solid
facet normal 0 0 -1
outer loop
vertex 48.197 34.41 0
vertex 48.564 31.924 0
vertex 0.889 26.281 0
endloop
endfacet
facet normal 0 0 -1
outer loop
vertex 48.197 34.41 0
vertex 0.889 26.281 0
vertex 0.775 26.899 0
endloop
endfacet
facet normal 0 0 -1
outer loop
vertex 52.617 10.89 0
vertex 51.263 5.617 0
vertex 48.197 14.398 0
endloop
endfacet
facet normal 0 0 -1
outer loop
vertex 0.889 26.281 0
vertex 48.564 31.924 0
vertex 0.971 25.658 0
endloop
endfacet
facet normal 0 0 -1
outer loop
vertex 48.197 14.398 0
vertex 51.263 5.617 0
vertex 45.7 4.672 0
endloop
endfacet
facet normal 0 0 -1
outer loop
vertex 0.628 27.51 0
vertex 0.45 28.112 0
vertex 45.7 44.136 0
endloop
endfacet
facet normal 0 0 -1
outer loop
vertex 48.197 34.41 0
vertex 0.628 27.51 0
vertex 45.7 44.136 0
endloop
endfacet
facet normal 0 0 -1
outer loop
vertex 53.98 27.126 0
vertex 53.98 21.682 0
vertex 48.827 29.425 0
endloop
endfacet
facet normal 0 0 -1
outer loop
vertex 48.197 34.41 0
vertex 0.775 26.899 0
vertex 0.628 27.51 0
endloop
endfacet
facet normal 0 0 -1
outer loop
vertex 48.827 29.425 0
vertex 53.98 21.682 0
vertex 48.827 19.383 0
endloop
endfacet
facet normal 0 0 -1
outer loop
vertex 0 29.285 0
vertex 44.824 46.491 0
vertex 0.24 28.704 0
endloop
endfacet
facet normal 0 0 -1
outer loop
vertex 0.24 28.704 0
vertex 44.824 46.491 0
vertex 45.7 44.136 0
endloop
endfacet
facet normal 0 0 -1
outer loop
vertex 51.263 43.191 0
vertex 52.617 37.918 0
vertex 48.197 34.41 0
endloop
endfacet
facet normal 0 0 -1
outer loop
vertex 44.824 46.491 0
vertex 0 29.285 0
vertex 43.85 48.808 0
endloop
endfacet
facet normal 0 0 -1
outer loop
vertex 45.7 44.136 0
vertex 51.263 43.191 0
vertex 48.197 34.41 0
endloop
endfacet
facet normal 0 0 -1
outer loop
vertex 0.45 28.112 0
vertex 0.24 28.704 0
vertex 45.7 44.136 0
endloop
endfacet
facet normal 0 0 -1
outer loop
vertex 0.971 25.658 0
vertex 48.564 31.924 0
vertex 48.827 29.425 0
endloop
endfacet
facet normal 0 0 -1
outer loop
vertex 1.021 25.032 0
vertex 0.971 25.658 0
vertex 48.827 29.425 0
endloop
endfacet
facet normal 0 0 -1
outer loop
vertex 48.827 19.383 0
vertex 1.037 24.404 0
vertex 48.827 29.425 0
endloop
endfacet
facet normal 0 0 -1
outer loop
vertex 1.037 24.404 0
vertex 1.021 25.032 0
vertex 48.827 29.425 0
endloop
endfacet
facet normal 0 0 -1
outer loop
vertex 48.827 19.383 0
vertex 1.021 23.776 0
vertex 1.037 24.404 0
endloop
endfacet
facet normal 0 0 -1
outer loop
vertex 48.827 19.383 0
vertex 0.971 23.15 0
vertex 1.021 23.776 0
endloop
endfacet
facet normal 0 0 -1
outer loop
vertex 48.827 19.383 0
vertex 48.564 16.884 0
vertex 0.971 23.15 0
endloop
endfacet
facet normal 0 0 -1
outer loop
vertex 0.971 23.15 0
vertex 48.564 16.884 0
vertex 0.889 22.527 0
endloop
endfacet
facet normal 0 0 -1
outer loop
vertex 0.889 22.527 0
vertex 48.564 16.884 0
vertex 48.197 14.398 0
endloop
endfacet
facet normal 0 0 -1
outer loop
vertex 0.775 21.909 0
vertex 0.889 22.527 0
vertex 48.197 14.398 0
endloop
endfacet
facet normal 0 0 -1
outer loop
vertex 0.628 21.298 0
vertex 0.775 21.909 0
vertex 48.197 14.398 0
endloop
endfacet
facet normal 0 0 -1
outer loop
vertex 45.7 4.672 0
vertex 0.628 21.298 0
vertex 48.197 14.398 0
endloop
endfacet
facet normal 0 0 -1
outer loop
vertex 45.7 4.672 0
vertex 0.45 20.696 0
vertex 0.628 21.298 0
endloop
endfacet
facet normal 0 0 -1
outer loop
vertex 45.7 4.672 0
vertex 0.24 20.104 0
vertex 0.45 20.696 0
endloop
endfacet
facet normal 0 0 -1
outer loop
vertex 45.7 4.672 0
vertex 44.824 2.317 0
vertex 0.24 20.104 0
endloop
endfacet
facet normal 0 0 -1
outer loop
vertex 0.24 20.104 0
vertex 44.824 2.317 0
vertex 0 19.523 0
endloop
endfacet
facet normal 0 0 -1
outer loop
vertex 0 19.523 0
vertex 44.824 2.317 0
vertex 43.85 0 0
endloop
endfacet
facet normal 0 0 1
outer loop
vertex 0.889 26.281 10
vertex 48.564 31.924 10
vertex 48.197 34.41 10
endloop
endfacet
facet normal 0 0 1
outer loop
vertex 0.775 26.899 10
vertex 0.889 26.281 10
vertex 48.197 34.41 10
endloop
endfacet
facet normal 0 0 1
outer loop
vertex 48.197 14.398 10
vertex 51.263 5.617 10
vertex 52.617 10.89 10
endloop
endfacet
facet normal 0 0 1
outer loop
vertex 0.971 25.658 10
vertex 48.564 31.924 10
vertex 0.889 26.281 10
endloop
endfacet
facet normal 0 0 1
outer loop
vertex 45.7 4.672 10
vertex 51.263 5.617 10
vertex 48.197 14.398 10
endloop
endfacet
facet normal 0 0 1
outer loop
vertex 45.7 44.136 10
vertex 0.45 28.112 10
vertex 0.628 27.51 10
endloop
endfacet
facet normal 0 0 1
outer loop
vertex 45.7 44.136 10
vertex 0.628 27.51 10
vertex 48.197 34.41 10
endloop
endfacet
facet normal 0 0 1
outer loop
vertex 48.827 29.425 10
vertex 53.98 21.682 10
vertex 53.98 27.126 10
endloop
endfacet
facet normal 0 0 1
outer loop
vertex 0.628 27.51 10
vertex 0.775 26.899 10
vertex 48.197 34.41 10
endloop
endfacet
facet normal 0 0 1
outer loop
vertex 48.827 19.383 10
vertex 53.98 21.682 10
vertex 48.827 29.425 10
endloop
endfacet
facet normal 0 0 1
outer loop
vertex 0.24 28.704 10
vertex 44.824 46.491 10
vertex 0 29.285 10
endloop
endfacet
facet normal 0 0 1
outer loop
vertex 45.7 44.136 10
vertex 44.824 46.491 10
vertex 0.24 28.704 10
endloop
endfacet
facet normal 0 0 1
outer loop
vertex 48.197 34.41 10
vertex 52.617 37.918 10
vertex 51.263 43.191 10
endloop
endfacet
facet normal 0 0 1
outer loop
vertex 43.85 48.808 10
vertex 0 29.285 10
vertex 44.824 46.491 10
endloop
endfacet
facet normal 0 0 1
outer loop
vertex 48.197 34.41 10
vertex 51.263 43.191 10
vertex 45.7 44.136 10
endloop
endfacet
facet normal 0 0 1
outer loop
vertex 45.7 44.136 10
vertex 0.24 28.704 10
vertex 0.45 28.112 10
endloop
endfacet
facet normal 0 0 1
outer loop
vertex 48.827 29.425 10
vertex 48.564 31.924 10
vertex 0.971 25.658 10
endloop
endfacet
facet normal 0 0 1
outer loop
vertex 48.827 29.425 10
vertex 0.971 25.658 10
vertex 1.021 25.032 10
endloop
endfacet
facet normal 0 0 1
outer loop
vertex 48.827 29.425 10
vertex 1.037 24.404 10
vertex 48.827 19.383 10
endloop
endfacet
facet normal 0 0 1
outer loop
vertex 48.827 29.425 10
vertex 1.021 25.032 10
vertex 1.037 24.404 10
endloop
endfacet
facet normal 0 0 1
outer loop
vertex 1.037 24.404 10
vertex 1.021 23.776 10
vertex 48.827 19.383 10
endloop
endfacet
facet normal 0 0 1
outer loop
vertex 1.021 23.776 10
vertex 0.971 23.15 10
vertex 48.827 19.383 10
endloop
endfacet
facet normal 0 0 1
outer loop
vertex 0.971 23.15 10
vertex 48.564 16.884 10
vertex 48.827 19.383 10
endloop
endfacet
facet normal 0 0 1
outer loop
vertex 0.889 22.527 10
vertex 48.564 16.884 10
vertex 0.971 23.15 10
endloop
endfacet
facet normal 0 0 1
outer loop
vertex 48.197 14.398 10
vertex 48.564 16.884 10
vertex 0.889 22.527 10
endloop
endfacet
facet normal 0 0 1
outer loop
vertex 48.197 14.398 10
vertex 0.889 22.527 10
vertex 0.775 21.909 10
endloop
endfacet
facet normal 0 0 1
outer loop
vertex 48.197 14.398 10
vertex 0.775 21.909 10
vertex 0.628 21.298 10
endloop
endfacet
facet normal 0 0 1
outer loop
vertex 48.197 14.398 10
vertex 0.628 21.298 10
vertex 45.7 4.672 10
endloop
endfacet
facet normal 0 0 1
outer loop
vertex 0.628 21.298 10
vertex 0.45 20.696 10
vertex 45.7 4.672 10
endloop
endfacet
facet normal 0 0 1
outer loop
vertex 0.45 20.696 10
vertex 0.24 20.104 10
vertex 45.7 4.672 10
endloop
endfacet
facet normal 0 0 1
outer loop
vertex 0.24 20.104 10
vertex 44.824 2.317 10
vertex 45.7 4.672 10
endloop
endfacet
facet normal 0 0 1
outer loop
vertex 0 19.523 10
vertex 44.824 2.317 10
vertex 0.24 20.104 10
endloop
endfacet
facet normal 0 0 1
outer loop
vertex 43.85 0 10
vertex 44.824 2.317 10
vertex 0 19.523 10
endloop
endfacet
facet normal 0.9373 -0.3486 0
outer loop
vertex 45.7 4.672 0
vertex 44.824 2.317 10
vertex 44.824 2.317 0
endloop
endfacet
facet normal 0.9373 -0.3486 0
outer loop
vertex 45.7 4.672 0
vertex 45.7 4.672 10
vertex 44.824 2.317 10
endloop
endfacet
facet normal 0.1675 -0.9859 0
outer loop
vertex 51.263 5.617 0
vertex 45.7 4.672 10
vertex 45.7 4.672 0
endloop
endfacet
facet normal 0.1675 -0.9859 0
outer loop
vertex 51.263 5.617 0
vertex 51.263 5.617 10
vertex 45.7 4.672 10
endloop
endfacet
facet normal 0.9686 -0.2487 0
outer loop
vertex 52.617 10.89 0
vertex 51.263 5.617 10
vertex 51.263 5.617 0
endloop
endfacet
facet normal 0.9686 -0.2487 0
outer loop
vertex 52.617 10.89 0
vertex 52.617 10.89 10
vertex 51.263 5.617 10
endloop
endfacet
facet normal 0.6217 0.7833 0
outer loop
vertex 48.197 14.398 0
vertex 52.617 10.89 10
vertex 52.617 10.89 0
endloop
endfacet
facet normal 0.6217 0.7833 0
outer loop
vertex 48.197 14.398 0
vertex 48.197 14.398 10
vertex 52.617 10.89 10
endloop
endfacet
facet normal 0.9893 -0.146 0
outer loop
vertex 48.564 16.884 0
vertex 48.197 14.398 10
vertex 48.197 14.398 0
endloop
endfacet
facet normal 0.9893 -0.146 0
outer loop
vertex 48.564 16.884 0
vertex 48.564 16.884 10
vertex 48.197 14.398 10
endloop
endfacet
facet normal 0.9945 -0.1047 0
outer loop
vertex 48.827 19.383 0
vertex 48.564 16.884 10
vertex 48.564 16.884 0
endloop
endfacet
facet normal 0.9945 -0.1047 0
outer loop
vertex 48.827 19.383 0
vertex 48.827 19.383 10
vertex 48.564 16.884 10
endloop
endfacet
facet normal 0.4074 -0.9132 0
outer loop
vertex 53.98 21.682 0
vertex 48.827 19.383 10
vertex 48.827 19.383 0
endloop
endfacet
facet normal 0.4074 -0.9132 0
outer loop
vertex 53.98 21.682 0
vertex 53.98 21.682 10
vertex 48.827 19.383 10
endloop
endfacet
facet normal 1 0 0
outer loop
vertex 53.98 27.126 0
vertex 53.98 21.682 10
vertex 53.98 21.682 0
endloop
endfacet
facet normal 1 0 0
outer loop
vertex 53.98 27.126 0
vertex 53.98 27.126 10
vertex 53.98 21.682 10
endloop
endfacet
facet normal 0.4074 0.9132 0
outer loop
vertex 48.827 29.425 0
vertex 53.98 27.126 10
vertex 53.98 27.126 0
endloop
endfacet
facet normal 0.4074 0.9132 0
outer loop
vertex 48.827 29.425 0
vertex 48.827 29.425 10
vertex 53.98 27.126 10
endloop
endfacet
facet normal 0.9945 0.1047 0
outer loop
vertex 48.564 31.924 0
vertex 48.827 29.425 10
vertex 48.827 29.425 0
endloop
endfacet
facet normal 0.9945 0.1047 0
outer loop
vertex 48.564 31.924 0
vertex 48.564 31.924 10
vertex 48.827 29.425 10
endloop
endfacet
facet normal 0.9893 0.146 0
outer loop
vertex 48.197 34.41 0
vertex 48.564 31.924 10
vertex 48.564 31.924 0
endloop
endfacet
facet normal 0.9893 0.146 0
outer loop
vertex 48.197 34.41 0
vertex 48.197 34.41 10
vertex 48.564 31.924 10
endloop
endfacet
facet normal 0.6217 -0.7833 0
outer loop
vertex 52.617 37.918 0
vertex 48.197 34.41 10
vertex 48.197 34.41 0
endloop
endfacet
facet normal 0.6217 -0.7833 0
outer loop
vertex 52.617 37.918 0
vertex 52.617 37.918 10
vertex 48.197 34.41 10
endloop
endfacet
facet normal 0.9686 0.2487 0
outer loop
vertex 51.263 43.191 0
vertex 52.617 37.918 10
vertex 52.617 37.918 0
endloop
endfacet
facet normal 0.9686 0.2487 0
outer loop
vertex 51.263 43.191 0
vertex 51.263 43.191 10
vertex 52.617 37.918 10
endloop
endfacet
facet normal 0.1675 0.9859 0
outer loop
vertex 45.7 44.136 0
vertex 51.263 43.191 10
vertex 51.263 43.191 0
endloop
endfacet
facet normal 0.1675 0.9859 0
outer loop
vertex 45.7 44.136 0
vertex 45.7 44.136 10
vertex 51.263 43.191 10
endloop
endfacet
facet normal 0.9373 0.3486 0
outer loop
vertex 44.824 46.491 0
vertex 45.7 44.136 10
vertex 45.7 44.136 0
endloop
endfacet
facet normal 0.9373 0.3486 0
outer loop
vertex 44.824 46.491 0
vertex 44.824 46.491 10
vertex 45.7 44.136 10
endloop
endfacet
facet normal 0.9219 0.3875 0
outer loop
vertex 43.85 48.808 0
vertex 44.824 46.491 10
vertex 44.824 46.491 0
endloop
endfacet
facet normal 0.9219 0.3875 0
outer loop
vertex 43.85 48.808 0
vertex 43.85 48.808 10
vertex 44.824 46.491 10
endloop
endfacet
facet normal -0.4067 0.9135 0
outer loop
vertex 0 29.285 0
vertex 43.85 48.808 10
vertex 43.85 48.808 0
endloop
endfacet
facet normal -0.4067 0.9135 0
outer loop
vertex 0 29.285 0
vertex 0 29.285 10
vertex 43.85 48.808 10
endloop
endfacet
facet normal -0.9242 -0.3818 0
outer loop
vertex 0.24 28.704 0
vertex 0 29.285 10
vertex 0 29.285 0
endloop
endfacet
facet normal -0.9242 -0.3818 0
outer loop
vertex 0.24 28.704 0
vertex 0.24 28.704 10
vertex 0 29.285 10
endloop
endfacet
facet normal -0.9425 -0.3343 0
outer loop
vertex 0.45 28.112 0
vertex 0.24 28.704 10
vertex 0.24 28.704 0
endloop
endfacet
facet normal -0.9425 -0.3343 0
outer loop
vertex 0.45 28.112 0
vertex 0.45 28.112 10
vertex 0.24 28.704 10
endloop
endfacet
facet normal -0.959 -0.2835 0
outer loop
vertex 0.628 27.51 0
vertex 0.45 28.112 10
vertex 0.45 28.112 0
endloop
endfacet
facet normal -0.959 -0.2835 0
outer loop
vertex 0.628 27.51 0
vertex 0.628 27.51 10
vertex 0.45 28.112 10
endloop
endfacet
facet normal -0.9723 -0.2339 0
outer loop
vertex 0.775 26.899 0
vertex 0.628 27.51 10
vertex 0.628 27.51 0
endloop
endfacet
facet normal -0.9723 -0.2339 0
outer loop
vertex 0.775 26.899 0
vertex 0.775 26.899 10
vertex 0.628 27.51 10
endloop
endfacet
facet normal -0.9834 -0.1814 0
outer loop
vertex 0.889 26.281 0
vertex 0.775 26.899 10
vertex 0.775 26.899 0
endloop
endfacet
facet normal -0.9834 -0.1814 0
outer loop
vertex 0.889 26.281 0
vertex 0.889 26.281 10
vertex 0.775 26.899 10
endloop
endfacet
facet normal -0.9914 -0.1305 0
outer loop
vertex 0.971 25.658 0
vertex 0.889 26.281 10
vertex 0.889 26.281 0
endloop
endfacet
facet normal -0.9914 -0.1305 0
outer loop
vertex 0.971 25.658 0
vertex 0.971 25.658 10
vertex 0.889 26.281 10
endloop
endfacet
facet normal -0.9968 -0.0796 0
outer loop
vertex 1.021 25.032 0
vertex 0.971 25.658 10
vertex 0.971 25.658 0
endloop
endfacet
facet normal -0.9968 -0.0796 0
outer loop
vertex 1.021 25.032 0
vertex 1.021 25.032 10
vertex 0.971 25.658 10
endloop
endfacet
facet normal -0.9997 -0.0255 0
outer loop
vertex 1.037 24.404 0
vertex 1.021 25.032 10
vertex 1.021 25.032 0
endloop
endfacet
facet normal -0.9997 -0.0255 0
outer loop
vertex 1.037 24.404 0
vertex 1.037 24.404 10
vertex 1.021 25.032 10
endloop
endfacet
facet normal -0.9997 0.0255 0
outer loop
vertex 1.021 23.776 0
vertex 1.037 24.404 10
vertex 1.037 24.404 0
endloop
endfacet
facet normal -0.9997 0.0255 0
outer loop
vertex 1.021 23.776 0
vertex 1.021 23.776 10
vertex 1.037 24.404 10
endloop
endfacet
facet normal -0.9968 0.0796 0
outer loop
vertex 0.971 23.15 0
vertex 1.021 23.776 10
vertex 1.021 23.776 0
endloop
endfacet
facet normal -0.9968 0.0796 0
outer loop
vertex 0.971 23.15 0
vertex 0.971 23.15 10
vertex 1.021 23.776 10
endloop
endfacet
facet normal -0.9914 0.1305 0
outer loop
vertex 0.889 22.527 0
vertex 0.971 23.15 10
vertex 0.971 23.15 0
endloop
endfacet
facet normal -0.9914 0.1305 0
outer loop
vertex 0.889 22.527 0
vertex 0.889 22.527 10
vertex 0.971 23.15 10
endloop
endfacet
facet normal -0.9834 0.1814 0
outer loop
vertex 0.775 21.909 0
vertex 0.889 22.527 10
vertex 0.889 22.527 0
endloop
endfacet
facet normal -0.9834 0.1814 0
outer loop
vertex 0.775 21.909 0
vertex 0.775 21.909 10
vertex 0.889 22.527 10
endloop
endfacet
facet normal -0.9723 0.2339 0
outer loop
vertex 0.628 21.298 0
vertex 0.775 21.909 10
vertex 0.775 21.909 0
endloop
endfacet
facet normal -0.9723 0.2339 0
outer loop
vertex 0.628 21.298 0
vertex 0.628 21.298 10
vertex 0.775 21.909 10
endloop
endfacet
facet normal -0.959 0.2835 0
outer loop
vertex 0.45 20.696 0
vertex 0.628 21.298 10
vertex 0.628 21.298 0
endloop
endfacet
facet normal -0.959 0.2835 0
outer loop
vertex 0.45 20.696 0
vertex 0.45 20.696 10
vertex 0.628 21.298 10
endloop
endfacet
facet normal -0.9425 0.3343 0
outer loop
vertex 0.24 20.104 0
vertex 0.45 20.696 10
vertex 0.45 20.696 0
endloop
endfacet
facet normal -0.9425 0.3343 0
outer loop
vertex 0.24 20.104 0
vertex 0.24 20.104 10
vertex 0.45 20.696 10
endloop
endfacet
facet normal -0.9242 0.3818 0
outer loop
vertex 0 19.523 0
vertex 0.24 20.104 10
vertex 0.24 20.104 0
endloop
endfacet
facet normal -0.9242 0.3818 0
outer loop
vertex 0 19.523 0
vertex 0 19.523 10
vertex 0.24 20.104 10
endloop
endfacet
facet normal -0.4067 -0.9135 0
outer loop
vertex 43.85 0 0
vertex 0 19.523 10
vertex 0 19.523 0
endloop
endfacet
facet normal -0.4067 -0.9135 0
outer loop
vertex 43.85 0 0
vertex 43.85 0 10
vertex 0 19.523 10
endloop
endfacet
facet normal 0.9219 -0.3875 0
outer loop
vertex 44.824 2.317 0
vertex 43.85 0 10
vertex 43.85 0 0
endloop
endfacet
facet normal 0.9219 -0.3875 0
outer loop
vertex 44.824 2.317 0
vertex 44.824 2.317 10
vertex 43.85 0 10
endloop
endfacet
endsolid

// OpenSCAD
$fn = 32;

// ----------------------------------------------------------------------
// Gear sector: 3 teeth on 48 degrees
// ----------------------------------------------------------------------

// --- parameters (mm) ---
sector_angle = 48;        // sector angle, degrees
root_r = 60;              // root circle radius
tooth_h = 5;              // tooth height over the root circle
teeth = 3;                // number of teeth on the sector
hub_r = 12;               // hub bore radius
plate_t = 10;             // sector thickness, Z
arc_step = 3;             // sampling step of the root/hub arcs, degrees
fit_tol = 0.05;           // declared fit tolerance (prompt contract)
free_tol = 0.3;           // declared free tolerance (prompt contract)

tip_r = root_r + tooth_h;  // tip circle radius

profile = [[43.85, 0], [44.824, 2.317], [45.7, 4.672], [51.263, 5.617], [52.617, 10.89], [48.197, 14.398], [48.564, 16.884], [48.827, 19.383], [53.98, 21.682], [53.98, 27.126], [48.827, 29.425], [48.564, 31.924], [48.197, 34.41], [52.617, 37.918], [51.263, 43.191], [45.7, 44.136], [44.824, 46.491], [43.85, 48.808], [0, 29.285], [0.24, 28.704], [0.45, 28.112], [0.628, 27.51], [0.775, 26.899], [0.889, 26.281], [0.971, 25.658], [1.021, 25.032], [1.037, 24.404], [1.021, 23.776], [0.971, 23.15], [0.889, 22.527], [0.775, 21.909], [0.628, 21.298], [0.45, 20.696], [0.24, 20.104], [0, 19.523]];  // primary outline, 35 points, counter clockwise

// --- the one profile operation ---
linear_extrude(height = plate_t) polygon(points = profile);
